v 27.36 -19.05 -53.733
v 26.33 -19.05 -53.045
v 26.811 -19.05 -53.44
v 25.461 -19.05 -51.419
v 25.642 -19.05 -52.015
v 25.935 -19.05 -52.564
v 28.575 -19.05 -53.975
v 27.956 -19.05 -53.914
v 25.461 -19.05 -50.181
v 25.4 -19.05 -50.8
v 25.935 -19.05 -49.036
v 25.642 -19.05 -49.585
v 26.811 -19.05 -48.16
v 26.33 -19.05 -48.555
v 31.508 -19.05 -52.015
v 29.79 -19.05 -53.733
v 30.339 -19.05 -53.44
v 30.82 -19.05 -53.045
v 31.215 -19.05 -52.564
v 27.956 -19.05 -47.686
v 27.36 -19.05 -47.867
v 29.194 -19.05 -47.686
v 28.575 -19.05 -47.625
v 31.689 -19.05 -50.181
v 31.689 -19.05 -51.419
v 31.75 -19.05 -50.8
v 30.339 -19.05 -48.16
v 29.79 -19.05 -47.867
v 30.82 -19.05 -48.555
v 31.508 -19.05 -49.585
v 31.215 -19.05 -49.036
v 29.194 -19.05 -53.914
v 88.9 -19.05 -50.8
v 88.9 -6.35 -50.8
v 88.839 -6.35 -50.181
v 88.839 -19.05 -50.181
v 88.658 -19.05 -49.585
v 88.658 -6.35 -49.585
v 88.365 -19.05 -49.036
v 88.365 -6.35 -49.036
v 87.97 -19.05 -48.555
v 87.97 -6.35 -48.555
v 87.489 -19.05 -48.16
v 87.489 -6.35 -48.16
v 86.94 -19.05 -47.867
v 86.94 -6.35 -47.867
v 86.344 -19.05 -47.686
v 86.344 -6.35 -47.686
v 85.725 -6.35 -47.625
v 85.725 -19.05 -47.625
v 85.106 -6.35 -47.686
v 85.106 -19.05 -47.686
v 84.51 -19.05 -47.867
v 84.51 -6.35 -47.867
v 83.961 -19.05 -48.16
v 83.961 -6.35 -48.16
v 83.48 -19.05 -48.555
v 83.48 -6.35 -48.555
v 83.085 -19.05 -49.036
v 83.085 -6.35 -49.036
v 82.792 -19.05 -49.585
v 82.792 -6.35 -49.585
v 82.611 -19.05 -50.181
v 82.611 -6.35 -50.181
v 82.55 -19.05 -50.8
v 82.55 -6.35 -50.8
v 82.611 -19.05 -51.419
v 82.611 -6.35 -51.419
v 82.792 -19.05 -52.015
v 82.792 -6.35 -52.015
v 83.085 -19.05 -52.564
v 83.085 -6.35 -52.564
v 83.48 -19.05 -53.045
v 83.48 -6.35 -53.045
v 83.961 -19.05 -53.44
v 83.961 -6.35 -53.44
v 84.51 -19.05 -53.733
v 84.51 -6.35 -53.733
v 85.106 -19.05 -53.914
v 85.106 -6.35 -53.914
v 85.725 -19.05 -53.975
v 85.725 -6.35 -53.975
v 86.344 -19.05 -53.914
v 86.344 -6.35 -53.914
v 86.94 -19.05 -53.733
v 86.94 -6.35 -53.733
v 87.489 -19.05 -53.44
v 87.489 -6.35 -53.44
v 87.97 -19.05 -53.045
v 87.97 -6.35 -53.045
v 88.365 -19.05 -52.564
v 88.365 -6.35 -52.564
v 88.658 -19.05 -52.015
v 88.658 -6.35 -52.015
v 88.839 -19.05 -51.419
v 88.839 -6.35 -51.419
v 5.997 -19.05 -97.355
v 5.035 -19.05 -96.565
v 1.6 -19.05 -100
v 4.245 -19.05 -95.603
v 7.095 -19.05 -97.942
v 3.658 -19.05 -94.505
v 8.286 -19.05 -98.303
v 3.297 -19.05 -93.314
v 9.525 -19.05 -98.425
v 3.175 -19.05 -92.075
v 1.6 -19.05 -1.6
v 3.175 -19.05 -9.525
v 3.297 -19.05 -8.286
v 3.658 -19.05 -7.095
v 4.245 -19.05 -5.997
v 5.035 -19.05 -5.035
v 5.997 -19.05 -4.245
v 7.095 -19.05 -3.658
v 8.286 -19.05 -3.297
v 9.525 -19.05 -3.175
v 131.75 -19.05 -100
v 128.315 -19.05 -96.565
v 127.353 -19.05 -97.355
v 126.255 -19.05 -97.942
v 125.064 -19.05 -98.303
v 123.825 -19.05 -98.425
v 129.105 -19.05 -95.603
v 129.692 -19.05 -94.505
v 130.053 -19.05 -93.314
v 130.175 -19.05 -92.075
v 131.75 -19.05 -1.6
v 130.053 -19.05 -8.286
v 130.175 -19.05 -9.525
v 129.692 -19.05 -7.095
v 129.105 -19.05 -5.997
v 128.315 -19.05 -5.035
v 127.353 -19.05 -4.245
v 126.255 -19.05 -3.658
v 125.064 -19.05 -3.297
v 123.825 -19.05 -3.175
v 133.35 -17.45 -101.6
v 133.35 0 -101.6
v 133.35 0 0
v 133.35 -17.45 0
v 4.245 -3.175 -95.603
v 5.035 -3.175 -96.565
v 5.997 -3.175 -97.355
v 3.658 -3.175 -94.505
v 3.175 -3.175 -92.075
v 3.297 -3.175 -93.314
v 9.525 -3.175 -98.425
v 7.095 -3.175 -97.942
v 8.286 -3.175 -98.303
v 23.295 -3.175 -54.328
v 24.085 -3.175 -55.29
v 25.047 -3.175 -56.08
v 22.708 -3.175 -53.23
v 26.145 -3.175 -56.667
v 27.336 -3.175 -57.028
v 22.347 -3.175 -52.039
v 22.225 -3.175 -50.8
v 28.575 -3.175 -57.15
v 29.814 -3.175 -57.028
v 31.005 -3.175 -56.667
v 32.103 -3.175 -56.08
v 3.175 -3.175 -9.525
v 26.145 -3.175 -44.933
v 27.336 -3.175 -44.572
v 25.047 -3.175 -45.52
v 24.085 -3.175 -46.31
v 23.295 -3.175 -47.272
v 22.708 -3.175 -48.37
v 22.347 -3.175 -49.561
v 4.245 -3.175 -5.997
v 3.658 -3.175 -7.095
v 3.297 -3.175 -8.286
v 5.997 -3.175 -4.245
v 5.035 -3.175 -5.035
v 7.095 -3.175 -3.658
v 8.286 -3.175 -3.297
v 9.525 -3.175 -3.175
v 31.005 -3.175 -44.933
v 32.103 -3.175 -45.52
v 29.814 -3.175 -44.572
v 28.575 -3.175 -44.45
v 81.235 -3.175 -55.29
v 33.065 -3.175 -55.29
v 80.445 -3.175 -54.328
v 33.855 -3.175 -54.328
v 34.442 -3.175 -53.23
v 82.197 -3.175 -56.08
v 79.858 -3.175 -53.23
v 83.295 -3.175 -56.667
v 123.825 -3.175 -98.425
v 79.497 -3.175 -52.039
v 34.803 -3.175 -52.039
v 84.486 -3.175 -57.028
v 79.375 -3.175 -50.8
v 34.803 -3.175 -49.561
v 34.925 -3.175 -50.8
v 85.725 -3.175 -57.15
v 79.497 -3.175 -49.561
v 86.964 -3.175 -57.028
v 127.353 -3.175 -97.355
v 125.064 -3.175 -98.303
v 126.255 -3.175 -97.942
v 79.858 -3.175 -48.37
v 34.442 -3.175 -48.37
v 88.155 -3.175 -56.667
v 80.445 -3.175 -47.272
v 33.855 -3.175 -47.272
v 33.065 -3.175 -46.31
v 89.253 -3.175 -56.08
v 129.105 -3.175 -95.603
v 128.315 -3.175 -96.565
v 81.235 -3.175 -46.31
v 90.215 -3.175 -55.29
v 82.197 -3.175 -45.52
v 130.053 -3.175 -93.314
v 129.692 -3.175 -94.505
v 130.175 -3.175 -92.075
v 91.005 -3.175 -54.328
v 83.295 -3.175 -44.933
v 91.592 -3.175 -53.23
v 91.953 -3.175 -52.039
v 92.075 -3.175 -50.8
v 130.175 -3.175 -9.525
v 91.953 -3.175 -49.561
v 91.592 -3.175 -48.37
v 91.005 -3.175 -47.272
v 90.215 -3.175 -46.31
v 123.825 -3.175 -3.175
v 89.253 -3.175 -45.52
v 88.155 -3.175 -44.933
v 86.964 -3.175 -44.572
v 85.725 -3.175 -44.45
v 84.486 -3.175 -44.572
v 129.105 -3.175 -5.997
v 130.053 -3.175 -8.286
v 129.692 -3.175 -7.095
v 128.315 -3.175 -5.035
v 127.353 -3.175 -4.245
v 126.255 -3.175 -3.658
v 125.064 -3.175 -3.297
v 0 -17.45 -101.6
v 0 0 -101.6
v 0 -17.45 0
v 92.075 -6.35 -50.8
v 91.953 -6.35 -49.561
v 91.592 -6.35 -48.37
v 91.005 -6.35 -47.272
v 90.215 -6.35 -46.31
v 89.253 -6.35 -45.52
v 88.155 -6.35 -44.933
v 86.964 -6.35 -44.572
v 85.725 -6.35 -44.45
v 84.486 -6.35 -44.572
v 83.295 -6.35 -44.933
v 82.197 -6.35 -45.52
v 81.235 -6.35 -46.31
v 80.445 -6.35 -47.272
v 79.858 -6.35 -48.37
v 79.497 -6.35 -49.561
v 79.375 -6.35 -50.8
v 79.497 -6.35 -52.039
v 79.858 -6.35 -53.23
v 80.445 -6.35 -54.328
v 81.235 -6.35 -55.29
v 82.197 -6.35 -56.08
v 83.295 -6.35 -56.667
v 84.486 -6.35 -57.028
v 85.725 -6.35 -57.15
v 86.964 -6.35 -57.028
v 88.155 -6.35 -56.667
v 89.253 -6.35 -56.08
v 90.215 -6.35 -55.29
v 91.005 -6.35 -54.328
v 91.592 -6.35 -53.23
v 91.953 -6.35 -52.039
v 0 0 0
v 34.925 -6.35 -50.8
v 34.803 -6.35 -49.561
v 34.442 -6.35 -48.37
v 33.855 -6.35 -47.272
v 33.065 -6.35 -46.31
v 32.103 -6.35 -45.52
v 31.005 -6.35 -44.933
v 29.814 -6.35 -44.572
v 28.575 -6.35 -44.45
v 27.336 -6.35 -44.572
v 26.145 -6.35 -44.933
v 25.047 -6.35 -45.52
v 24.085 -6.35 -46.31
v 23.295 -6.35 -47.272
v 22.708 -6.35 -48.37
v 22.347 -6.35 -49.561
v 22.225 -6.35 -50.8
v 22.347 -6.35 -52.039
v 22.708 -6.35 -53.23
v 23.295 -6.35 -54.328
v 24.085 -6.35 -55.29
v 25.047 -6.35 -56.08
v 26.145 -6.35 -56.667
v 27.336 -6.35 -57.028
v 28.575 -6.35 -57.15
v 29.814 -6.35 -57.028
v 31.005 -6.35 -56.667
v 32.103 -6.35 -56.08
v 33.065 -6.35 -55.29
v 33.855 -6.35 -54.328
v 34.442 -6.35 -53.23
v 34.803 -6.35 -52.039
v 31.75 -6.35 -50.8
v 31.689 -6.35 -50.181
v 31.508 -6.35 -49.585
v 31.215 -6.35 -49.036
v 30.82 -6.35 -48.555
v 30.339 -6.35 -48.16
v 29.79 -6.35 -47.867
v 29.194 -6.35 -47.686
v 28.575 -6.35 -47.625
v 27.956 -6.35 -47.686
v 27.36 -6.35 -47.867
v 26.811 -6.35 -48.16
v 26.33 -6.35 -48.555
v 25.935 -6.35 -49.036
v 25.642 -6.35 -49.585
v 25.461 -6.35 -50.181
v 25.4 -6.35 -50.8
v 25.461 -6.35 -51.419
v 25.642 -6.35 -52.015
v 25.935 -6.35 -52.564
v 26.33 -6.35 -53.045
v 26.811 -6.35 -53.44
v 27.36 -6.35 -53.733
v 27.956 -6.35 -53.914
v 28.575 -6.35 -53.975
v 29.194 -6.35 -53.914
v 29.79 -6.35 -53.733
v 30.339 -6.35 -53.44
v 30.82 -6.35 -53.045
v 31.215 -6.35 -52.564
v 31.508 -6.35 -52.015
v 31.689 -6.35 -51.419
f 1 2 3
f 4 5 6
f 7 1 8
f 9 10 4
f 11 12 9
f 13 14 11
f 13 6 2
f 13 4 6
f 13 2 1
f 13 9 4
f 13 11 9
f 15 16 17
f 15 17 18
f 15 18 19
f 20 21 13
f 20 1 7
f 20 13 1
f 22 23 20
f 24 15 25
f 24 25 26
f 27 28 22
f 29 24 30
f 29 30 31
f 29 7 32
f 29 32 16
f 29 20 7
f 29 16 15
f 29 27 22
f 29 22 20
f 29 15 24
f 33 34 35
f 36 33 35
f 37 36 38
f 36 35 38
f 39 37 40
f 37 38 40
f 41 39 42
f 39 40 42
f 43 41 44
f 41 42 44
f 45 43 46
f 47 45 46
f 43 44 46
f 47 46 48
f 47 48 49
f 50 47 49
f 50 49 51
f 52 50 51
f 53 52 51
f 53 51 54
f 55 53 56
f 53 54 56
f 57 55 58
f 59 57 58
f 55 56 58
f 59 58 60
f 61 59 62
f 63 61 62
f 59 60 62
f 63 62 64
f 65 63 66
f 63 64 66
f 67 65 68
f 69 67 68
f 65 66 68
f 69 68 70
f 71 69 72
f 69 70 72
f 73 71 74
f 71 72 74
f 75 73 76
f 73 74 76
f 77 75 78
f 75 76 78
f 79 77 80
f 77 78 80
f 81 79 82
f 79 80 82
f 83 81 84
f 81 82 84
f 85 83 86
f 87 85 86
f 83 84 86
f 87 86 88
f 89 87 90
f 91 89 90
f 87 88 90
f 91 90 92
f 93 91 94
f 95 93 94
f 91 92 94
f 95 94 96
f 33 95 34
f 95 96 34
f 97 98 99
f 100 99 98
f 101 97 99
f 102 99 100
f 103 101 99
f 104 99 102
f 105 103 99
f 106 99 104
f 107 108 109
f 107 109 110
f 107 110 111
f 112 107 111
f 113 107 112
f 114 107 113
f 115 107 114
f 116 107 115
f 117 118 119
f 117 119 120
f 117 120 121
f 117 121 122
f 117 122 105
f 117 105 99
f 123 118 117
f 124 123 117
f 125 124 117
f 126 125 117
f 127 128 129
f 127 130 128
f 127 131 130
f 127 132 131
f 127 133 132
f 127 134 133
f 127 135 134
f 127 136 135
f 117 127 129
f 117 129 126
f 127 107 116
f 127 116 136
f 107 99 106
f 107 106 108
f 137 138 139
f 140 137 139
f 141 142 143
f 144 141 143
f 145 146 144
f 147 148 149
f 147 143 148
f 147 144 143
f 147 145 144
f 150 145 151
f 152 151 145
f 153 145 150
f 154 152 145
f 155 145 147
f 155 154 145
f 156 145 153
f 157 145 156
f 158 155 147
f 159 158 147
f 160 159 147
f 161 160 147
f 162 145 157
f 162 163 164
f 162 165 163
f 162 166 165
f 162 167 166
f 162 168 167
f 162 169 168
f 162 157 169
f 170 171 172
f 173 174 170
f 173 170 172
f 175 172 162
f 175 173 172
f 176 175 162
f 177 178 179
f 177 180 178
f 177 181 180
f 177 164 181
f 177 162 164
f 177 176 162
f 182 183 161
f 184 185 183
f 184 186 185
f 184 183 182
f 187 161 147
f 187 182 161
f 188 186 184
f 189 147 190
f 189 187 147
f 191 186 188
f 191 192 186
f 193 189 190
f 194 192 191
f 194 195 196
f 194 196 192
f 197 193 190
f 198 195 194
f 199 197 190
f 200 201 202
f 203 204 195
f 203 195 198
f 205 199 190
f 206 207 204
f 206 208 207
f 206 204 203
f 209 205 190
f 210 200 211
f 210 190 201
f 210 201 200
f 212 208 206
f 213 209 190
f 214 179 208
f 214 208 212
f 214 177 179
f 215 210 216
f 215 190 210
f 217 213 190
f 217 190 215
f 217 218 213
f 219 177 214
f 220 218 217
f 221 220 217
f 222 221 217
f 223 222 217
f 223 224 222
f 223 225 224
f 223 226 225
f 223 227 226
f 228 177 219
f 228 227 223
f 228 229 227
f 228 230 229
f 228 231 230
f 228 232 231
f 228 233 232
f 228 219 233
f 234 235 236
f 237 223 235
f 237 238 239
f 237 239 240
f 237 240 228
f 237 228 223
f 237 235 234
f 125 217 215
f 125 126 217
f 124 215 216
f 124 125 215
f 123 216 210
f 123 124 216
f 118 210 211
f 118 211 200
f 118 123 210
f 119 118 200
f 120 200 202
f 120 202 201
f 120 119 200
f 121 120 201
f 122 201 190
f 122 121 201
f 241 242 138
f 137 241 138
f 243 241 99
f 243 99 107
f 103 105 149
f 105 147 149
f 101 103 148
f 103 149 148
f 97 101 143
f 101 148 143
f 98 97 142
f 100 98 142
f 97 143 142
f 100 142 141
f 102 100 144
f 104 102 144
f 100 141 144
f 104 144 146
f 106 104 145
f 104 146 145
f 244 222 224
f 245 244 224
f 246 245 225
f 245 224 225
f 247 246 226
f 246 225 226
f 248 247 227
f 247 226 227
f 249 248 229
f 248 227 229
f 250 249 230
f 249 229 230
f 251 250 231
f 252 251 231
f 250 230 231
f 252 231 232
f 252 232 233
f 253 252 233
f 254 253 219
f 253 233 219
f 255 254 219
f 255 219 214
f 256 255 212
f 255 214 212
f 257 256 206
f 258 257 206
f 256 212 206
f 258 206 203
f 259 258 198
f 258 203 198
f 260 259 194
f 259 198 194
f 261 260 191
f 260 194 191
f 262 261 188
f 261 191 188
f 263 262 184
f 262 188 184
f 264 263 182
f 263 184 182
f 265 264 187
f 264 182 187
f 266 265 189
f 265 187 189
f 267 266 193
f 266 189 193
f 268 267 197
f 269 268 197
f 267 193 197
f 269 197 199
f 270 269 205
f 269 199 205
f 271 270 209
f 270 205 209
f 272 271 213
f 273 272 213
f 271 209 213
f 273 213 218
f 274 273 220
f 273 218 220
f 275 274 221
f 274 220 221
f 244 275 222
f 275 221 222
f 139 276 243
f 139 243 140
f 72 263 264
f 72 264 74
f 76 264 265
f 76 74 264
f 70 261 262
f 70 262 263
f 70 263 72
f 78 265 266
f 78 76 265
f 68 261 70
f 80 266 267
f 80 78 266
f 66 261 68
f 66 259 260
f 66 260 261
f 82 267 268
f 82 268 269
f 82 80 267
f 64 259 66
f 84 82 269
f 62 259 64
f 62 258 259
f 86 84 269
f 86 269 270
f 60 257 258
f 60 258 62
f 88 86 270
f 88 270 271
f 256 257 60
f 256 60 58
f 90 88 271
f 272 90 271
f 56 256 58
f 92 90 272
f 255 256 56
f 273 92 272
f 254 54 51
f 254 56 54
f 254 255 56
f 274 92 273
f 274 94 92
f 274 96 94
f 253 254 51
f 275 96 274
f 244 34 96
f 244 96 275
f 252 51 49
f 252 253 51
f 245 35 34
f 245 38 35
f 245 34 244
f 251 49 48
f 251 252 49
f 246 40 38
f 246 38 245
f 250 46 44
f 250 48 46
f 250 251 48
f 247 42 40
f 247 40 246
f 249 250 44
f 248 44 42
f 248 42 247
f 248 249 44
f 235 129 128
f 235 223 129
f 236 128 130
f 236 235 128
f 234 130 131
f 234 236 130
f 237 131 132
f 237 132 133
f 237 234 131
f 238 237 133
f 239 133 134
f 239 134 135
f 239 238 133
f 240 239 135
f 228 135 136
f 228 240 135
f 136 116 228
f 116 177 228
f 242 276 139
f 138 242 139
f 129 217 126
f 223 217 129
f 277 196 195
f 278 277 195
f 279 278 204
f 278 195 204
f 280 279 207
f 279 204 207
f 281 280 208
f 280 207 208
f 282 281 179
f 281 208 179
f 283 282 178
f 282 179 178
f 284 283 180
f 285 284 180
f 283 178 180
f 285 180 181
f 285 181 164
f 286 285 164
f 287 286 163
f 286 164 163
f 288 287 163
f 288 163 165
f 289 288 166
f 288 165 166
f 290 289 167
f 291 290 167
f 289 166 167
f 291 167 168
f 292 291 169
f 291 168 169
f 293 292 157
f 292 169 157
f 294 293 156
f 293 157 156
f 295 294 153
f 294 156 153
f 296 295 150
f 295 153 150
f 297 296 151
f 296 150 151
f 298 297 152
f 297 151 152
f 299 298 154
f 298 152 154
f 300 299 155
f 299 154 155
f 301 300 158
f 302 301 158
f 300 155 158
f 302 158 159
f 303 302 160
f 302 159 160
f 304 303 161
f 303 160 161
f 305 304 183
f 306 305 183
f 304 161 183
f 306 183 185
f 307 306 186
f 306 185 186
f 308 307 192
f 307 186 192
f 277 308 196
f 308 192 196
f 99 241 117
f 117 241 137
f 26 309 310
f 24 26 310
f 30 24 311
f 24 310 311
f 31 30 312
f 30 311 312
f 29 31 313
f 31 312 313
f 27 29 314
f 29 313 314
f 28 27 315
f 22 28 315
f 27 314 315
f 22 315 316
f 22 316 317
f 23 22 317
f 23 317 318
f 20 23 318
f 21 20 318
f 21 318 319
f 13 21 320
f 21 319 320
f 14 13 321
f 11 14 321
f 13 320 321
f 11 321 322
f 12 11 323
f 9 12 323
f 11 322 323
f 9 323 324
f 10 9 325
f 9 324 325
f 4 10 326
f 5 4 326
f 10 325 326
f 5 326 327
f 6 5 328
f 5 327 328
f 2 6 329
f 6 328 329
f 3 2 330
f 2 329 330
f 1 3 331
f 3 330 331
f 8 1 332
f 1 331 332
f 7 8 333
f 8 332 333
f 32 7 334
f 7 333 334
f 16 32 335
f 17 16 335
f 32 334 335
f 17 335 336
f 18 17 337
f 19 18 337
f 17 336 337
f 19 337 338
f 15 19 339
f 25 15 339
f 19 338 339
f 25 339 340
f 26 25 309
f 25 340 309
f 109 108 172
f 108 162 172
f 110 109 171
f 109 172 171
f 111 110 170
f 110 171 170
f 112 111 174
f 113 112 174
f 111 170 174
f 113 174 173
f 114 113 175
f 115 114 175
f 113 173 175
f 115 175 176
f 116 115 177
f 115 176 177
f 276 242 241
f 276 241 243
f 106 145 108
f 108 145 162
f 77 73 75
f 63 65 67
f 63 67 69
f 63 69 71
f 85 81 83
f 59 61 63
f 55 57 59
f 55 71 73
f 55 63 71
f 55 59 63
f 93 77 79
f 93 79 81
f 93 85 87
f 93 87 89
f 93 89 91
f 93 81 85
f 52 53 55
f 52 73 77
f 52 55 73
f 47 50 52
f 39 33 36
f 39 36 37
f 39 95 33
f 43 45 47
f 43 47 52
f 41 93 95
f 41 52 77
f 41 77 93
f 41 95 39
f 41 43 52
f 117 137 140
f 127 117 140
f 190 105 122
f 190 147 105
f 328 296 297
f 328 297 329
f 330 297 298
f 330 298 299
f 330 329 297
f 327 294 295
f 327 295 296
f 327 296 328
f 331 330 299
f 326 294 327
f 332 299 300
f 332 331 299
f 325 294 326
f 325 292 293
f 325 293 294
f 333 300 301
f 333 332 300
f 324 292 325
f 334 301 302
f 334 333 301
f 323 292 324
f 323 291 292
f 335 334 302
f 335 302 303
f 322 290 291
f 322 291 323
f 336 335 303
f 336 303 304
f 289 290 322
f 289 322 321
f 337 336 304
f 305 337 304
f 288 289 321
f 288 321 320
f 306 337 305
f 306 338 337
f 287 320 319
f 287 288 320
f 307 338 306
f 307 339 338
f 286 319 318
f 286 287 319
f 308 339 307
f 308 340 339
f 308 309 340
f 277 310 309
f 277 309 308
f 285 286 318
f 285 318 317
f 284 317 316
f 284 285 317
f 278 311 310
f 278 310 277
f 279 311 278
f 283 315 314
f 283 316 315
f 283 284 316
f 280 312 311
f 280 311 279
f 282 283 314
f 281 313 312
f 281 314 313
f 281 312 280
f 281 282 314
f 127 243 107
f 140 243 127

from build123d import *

# Parameters (mm, degrees)
F0_W     = 133.35
F0_H     = 101.6
F1_DEPTH = 19.05
F2_T     = -3.175
F3_R     = 6.35
F4_DEPTH = 3.175
F5_R     = 3.175
F6_DEPTH = 12.7
F7_R     = 3.175
F8_DEPTH = 12.7
F9_R     = 6.35
F10_SIZE = 1.6002


with BuildPart() as f1:
    # F0 (on Front) → F1 (new body)
    with BuildSketch(Plane.XZ):
        with Locations((66.675, -50.8)):
            Rectangle(F0_W, F0_H)
    extrude(amount=F1_DEPTH)

    # F2
    f2_openings = [f1.faces().sort_by_distance(p)[0] for p in [
        (66.675, -19.05, -50.8),
    ]]
    offset(amount=F2_T, openings=f2_openings)

    # F3 (on face) → F4 (join)
    with BuildSketch(Plane.XZ.offset(3.175)):
        with Locations((28.575, -50.8)):
            Circle(F3_R)
        with Locations((85.725, -50.8)):
            Circle(F3_R)
    extrude(amount=F4_DEPTH)

    # F5 (on face) → F6 (join)
    with BuildSketch(Plane.XZ.offset(6.35)):
        with Locations((28.575, -50.8)):
            Circle(F5_R)
    extrude(amount=F6_DEPTH)

    # F7 (on face) → F8 (join)
    with BuildSketch(Plane.XZ.offset(6.35)):
        with Locations((85.725, -50.8)):
            Circle(F7_R)
    extrude(amount=F8_DEPTH)

    # F9
    f9_edges = [f1.edges().sort_by_distance(p)[0] for p in [
        (3.175, -11.1125, -3.175),
        (130.175, -11.1125, -3.175),
        (3.175, -11.1125, -98.425),
        (130.175, -11.1125, -98.425),
    ]]
    fillet(f9_edges, radius=F9_R)

    # F10
    f10_edges = [f1.edges().sort_by_distance(p)[0] for p in [
        (66.675, -19.05, -101.6),
        (133.35, -19.05, -50.8),
        (66.675, -19.05, 0),
        (0, -19.05, -50.8),
    ]]
    chamfer(f10_edges, length=F10_SIZE)


solid = f1.part
